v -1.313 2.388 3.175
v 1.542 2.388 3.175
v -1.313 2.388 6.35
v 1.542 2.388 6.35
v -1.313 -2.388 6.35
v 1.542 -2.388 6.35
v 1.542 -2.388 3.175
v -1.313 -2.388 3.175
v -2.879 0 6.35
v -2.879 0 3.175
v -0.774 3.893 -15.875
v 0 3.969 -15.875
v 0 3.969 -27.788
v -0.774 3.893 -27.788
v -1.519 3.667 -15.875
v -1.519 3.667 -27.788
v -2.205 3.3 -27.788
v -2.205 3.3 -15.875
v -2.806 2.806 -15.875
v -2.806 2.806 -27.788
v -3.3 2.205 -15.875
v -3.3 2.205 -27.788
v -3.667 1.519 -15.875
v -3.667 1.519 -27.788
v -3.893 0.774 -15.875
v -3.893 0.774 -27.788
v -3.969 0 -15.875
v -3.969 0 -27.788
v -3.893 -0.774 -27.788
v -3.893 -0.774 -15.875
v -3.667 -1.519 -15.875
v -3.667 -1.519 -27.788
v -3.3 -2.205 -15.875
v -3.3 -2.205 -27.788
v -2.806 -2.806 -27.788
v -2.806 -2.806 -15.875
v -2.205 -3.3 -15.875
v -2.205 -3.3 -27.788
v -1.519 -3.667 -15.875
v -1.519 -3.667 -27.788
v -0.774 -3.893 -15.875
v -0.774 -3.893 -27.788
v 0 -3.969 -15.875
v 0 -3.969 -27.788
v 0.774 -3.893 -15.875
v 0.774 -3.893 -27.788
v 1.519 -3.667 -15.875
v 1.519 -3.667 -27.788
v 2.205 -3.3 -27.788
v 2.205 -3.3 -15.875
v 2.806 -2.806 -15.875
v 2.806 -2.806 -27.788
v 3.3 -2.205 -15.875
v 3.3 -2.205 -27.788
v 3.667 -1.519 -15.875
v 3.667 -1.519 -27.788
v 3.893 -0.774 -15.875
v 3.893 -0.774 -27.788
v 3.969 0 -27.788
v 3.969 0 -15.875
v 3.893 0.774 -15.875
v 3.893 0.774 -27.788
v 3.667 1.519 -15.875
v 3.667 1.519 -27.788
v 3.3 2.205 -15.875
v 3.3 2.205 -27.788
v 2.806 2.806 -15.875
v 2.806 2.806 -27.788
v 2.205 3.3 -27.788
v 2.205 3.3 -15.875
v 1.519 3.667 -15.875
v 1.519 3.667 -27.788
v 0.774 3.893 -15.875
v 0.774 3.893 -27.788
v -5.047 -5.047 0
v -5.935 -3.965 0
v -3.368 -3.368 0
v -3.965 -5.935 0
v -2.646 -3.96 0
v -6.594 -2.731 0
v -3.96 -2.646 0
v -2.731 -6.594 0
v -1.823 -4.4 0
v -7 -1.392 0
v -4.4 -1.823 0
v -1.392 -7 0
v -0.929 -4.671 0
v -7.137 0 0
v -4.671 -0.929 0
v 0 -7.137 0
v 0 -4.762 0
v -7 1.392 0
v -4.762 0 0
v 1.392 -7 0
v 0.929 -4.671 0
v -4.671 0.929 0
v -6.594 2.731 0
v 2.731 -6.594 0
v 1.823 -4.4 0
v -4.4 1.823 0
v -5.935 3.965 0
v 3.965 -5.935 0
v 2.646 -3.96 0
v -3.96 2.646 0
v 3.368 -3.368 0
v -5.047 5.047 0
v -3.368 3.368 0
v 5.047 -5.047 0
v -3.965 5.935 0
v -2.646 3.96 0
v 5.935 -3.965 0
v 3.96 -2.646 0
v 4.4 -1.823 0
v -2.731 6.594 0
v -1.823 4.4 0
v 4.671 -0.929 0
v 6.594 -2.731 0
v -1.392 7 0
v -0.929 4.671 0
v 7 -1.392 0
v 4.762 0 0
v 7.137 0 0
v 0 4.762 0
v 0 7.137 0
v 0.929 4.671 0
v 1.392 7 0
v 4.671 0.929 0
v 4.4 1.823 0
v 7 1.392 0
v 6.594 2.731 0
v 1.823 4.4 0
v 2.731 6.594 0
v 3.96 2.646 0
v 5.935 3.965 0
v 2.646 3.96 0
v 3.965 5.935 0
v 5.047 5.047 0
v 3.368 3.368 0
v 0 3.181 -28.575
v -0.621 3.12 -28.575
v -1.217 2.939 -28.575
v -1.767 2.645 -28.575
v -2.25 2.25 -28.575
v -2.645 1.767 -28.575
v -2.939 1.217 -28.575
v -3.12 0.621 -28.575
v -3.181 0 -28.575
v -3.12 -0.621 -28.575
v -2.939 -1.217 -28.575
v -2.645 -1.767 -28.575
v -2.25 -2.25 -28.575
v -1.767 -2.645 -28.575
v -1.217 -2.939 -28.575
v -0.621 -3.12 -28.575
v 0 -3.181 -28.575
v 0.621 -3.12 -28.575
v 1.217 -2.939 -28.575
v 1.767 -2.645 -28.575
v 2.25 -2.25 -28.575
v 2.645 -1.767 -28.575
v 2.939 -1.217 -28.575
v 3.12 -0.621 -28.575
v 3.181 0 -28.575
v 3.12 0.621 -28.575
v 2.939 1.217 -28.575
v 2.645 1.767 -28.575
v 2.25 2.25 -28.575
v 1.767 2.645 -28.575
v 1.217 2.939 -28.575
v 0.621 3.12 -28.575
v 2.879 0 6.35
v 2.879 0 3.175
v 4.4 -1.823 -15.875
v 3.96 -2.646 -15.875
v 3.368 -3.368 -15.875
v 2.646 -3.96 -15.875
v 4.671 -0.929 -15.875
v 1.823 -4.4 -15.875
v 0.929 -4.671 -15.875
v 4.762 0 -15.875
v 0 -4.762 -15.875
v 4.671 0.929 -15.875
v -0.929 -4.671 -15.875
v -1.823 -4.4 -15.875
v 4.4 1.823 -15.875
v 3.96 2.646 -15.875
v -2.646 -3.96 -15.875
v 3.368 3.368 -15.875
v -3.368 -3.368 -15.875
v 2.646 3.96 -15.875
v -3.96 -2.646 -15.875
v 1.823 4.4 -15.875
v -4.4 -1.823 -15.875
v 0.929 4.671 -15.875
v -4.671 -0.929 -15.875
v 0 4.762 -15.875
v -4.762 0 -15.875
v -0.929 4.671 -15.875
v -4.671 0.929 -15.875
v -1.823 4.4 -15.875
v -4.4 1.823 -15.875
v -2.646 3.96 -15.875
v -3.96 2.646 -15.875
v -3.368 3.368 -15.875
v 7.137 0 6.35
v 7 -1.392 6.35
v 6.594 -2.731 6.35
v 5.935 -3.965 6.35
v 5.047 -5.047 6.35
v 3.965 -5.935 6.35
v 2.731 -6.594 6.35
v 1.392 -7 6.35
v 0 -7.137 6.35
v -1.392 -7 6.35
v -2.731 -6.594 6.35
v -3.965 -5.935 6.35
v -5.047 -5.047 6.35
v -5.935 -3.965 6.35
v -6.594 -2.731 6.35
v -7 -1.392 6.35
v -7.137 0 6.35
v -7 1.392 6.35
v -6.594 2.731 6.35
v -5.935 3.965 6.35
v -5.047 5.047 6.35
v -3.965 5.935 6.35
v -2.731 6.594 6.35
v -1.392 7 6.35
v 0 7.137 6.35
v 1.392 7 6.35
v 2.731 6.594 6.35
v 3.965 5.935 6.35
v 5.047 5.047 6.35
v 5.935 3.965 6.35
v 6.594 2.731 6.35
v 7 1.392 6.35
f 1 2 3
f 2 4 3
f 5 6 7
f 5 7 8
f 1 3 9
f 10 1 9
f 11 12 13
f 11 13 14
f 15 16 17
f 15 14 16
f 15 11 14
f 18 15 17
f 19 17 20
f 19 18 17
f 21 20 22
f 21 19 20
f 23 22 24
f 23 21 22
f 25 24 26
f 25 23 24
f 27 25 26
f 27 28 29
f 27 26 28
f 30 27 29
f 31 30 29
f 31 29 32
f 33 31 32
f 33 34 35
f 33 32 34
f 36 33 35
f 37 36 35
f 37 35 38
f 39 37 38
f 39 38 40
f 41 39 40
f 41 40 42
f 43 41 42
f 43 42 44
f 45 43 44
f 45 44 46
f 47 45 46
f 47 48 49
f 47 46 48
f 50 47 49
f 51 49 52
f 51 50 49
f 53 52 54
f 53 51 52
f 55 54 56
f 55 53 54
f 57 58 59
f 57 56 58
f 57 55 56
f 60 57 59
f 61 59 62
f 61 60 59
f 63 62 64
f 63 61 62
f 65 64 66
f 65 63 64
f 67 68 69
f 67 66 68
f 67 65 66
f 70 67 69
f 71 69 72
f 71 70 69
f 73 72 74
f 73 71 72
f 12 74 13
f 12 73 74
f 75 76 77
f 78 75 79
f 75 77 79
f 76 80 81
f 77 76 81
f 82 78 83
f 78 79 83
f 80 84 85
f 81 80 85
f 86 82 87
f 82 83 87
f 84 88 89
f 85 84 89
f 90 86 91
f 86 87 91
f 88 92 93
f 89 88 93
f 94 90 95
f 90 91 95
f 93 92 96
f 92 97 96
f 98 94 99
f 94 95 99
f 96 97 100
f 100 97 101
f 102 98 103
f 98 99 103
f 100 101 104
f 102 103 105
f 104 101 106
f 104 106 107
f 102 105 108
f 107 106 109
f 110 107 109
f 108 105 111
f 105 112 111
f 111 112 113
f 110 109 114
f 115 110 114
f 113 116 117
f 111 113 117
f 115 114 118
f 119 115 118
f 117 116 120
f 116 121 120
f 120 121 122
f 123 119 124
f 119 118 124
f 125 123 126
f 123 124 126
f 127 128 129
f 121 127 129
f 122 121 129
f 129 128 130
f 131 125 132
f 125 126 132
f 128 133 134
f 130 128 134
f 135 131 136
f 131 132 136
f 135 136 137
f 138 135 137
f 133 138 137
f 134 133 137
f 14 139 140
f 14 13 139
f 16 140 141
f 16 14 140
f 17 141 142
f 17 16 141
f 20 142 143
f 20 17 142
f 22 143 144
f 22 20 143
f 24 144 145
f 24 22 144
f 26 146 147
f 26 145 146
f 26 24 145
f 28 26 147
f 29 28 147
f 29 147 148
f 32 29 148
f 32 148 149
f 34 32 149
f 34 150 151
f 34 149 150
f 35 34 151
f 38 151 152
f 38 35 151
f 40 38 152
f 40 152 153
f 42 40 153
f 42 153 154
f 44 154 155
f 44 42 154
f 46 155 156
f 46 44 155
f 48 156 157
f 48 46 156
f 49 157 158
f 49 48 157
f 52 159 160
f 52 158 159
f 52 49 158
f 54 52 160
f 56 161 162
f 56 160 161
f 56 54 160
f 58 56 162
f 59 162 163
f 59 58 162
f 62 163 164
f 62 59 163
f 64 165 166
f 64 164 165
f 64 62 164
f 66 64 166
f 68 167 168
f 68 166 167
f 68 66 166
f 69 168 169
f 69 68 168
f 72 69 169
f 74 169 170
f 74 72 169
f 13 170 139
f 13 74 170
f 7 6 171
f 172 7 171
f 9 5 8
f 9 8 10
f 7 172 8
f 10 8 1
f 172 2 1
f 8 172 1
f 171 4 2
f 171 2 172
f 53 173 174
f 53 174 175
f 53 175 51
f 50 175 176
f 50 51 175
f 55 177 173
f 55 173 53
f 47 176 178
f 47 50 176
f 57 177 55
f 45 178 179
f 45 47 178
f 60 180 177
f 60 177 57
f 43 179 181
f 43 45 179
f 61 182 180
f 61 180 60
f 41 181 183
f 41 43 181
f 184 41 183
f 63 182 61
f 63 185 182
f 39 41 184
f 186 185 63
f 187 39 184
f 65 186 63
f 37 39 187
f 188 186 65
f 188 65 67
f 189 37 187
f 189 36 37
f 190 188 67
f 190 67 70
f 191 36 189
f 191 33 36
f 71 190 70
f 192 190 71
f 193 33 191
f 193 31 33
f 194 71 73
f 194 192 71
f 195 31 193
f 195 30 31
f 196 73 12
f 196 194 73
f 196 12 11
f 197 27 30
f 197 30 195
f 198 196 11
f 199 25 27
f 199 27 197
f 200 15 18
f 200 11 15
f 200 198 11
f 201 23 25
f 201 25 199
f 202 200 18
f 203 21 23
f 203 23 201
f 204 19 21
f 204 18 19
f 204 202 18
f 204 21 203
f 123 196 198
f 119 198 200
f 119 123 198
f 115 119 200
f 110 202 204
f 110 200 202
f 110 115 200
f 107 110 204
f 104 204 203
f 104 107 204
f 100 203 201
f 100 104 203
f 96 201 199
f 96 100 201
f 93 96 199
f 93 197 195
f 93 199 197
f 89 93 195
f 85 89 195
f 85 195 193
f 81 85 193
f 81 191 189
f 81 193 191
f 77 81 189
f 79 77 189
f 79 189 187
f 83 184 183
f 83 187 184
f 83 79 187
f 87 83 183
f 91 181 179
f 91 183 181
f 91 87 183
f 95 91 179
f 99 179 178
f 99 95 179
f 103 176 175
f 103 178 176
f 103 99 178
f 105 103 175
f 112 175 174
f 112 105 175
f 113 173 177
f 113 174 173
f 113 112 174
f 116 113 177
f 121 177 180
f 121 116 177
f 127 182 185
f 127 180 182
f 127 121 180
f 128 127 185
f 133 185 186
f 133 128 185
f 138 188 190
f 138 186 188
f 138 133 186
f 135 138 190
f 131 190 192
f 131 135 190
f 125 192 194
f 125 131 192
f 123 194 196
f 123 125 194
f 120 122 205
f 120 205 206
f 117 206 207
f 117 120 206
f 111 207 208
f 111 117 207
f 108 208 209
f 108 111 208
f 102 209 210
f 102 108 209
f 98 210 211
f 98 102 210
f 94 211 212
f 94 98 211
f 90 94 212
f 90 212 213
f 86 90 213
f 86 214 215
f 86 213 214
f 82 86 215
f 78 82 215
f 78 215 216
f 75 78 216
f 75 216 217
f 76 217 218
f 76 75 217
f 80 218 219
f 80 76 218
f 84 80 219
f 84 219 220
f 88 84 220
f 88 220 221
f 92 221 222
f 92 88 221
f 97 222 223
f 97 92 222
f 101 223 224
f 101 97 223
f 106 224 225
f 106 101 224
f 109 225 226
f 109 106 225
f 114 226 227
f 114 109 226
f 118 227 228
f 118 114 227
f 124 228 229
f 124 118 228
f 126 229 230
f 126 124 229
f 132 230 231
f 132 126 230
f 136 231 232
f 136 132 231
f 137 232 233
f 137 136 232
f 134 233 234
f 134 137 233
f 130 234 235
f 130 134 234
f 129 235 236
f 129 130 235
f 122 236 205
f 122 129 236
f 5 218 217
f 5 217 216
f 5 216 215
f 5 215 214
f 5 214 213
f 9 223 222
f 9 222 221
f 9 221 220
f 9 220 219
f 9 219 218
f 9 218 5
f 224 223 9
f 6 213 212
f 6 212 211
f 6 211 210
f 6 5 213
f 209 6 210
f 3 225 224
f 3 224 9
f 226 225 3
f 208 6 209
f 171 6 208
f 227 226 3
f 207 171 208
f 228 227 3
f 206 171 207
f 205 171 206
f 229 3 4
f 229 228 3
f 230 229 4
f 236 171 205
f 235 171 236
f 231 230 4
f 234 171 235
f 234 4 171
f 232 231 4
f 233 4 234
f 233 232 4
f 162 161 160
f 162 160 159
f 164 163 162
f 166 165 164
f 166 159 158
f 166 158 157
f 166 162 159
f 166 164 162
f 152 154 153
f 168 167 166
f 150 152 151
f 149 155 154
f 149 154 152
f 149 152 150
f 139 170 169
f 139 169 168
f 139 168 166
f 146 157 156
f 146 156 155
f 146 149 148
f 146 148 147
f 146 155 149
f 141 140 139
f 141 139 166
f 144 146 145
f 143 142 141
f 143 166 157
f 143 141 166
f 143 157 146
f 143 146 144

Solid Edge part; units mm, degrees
sketch "Sketch1" plane through (0, 0, 0) normal (0, 0, 1) x (1, 0, 0)
  circle A0 centre (0, 0) radius 7.1374
  dimension "D1" = 14.2748
extrude "Protrusion1" add sketch "Sketch1" along normal blind 6.35
sketch "Sketch2" plane through (0, 0, 0) normal (0, 0, -1) x (0, 1, 0)
  circle A0 centre (0, 0) radius 4.7625
  dimension "D1" = 9.525
extrude "Protrusion2" add sketch "Sketch2" along normal blind 15.875
sketch "Sketch3" plane through (0, 0, -15.875) normal (0, 0, -1) x (0, 1, 0)
  circle A0 centre (0, 0) radius 3.9688
  dimension "D1" = 7.9375
extrude "Protrusion3" add sketch "Sketch3" along normal blind 12.7
sketch "Sketch4" plane through (0, 0, 6.35) normal (0, 0, 1) x (0, 1, 0)
  line L0 (-2.3876, 1.3131) -> (0, 2.8792)
  line L1 (-2.3876, -1.5424) -> (-2.3876, 1.3131)
  line L2 (-2.3876, -1.5424) -> (0, -2.8792)
  line L3 (2.3876, -1.5424) -> (0, -2.8792)
  line L4 (2.3876, -1.5424) -> (2.3876, 1.3131)
  line L5 (2.3876, 1.3131) -> (0, 2.8792)
  dimension "D1" = 4.7752
extrude "Cutout1" cut sketch "Sketch4" against normal blind 3.175
chamfer "Chamfer1" distance 0.7874 angle 45 1 edges at (0, -3.9688, -28.575)
properties part number "163434"
